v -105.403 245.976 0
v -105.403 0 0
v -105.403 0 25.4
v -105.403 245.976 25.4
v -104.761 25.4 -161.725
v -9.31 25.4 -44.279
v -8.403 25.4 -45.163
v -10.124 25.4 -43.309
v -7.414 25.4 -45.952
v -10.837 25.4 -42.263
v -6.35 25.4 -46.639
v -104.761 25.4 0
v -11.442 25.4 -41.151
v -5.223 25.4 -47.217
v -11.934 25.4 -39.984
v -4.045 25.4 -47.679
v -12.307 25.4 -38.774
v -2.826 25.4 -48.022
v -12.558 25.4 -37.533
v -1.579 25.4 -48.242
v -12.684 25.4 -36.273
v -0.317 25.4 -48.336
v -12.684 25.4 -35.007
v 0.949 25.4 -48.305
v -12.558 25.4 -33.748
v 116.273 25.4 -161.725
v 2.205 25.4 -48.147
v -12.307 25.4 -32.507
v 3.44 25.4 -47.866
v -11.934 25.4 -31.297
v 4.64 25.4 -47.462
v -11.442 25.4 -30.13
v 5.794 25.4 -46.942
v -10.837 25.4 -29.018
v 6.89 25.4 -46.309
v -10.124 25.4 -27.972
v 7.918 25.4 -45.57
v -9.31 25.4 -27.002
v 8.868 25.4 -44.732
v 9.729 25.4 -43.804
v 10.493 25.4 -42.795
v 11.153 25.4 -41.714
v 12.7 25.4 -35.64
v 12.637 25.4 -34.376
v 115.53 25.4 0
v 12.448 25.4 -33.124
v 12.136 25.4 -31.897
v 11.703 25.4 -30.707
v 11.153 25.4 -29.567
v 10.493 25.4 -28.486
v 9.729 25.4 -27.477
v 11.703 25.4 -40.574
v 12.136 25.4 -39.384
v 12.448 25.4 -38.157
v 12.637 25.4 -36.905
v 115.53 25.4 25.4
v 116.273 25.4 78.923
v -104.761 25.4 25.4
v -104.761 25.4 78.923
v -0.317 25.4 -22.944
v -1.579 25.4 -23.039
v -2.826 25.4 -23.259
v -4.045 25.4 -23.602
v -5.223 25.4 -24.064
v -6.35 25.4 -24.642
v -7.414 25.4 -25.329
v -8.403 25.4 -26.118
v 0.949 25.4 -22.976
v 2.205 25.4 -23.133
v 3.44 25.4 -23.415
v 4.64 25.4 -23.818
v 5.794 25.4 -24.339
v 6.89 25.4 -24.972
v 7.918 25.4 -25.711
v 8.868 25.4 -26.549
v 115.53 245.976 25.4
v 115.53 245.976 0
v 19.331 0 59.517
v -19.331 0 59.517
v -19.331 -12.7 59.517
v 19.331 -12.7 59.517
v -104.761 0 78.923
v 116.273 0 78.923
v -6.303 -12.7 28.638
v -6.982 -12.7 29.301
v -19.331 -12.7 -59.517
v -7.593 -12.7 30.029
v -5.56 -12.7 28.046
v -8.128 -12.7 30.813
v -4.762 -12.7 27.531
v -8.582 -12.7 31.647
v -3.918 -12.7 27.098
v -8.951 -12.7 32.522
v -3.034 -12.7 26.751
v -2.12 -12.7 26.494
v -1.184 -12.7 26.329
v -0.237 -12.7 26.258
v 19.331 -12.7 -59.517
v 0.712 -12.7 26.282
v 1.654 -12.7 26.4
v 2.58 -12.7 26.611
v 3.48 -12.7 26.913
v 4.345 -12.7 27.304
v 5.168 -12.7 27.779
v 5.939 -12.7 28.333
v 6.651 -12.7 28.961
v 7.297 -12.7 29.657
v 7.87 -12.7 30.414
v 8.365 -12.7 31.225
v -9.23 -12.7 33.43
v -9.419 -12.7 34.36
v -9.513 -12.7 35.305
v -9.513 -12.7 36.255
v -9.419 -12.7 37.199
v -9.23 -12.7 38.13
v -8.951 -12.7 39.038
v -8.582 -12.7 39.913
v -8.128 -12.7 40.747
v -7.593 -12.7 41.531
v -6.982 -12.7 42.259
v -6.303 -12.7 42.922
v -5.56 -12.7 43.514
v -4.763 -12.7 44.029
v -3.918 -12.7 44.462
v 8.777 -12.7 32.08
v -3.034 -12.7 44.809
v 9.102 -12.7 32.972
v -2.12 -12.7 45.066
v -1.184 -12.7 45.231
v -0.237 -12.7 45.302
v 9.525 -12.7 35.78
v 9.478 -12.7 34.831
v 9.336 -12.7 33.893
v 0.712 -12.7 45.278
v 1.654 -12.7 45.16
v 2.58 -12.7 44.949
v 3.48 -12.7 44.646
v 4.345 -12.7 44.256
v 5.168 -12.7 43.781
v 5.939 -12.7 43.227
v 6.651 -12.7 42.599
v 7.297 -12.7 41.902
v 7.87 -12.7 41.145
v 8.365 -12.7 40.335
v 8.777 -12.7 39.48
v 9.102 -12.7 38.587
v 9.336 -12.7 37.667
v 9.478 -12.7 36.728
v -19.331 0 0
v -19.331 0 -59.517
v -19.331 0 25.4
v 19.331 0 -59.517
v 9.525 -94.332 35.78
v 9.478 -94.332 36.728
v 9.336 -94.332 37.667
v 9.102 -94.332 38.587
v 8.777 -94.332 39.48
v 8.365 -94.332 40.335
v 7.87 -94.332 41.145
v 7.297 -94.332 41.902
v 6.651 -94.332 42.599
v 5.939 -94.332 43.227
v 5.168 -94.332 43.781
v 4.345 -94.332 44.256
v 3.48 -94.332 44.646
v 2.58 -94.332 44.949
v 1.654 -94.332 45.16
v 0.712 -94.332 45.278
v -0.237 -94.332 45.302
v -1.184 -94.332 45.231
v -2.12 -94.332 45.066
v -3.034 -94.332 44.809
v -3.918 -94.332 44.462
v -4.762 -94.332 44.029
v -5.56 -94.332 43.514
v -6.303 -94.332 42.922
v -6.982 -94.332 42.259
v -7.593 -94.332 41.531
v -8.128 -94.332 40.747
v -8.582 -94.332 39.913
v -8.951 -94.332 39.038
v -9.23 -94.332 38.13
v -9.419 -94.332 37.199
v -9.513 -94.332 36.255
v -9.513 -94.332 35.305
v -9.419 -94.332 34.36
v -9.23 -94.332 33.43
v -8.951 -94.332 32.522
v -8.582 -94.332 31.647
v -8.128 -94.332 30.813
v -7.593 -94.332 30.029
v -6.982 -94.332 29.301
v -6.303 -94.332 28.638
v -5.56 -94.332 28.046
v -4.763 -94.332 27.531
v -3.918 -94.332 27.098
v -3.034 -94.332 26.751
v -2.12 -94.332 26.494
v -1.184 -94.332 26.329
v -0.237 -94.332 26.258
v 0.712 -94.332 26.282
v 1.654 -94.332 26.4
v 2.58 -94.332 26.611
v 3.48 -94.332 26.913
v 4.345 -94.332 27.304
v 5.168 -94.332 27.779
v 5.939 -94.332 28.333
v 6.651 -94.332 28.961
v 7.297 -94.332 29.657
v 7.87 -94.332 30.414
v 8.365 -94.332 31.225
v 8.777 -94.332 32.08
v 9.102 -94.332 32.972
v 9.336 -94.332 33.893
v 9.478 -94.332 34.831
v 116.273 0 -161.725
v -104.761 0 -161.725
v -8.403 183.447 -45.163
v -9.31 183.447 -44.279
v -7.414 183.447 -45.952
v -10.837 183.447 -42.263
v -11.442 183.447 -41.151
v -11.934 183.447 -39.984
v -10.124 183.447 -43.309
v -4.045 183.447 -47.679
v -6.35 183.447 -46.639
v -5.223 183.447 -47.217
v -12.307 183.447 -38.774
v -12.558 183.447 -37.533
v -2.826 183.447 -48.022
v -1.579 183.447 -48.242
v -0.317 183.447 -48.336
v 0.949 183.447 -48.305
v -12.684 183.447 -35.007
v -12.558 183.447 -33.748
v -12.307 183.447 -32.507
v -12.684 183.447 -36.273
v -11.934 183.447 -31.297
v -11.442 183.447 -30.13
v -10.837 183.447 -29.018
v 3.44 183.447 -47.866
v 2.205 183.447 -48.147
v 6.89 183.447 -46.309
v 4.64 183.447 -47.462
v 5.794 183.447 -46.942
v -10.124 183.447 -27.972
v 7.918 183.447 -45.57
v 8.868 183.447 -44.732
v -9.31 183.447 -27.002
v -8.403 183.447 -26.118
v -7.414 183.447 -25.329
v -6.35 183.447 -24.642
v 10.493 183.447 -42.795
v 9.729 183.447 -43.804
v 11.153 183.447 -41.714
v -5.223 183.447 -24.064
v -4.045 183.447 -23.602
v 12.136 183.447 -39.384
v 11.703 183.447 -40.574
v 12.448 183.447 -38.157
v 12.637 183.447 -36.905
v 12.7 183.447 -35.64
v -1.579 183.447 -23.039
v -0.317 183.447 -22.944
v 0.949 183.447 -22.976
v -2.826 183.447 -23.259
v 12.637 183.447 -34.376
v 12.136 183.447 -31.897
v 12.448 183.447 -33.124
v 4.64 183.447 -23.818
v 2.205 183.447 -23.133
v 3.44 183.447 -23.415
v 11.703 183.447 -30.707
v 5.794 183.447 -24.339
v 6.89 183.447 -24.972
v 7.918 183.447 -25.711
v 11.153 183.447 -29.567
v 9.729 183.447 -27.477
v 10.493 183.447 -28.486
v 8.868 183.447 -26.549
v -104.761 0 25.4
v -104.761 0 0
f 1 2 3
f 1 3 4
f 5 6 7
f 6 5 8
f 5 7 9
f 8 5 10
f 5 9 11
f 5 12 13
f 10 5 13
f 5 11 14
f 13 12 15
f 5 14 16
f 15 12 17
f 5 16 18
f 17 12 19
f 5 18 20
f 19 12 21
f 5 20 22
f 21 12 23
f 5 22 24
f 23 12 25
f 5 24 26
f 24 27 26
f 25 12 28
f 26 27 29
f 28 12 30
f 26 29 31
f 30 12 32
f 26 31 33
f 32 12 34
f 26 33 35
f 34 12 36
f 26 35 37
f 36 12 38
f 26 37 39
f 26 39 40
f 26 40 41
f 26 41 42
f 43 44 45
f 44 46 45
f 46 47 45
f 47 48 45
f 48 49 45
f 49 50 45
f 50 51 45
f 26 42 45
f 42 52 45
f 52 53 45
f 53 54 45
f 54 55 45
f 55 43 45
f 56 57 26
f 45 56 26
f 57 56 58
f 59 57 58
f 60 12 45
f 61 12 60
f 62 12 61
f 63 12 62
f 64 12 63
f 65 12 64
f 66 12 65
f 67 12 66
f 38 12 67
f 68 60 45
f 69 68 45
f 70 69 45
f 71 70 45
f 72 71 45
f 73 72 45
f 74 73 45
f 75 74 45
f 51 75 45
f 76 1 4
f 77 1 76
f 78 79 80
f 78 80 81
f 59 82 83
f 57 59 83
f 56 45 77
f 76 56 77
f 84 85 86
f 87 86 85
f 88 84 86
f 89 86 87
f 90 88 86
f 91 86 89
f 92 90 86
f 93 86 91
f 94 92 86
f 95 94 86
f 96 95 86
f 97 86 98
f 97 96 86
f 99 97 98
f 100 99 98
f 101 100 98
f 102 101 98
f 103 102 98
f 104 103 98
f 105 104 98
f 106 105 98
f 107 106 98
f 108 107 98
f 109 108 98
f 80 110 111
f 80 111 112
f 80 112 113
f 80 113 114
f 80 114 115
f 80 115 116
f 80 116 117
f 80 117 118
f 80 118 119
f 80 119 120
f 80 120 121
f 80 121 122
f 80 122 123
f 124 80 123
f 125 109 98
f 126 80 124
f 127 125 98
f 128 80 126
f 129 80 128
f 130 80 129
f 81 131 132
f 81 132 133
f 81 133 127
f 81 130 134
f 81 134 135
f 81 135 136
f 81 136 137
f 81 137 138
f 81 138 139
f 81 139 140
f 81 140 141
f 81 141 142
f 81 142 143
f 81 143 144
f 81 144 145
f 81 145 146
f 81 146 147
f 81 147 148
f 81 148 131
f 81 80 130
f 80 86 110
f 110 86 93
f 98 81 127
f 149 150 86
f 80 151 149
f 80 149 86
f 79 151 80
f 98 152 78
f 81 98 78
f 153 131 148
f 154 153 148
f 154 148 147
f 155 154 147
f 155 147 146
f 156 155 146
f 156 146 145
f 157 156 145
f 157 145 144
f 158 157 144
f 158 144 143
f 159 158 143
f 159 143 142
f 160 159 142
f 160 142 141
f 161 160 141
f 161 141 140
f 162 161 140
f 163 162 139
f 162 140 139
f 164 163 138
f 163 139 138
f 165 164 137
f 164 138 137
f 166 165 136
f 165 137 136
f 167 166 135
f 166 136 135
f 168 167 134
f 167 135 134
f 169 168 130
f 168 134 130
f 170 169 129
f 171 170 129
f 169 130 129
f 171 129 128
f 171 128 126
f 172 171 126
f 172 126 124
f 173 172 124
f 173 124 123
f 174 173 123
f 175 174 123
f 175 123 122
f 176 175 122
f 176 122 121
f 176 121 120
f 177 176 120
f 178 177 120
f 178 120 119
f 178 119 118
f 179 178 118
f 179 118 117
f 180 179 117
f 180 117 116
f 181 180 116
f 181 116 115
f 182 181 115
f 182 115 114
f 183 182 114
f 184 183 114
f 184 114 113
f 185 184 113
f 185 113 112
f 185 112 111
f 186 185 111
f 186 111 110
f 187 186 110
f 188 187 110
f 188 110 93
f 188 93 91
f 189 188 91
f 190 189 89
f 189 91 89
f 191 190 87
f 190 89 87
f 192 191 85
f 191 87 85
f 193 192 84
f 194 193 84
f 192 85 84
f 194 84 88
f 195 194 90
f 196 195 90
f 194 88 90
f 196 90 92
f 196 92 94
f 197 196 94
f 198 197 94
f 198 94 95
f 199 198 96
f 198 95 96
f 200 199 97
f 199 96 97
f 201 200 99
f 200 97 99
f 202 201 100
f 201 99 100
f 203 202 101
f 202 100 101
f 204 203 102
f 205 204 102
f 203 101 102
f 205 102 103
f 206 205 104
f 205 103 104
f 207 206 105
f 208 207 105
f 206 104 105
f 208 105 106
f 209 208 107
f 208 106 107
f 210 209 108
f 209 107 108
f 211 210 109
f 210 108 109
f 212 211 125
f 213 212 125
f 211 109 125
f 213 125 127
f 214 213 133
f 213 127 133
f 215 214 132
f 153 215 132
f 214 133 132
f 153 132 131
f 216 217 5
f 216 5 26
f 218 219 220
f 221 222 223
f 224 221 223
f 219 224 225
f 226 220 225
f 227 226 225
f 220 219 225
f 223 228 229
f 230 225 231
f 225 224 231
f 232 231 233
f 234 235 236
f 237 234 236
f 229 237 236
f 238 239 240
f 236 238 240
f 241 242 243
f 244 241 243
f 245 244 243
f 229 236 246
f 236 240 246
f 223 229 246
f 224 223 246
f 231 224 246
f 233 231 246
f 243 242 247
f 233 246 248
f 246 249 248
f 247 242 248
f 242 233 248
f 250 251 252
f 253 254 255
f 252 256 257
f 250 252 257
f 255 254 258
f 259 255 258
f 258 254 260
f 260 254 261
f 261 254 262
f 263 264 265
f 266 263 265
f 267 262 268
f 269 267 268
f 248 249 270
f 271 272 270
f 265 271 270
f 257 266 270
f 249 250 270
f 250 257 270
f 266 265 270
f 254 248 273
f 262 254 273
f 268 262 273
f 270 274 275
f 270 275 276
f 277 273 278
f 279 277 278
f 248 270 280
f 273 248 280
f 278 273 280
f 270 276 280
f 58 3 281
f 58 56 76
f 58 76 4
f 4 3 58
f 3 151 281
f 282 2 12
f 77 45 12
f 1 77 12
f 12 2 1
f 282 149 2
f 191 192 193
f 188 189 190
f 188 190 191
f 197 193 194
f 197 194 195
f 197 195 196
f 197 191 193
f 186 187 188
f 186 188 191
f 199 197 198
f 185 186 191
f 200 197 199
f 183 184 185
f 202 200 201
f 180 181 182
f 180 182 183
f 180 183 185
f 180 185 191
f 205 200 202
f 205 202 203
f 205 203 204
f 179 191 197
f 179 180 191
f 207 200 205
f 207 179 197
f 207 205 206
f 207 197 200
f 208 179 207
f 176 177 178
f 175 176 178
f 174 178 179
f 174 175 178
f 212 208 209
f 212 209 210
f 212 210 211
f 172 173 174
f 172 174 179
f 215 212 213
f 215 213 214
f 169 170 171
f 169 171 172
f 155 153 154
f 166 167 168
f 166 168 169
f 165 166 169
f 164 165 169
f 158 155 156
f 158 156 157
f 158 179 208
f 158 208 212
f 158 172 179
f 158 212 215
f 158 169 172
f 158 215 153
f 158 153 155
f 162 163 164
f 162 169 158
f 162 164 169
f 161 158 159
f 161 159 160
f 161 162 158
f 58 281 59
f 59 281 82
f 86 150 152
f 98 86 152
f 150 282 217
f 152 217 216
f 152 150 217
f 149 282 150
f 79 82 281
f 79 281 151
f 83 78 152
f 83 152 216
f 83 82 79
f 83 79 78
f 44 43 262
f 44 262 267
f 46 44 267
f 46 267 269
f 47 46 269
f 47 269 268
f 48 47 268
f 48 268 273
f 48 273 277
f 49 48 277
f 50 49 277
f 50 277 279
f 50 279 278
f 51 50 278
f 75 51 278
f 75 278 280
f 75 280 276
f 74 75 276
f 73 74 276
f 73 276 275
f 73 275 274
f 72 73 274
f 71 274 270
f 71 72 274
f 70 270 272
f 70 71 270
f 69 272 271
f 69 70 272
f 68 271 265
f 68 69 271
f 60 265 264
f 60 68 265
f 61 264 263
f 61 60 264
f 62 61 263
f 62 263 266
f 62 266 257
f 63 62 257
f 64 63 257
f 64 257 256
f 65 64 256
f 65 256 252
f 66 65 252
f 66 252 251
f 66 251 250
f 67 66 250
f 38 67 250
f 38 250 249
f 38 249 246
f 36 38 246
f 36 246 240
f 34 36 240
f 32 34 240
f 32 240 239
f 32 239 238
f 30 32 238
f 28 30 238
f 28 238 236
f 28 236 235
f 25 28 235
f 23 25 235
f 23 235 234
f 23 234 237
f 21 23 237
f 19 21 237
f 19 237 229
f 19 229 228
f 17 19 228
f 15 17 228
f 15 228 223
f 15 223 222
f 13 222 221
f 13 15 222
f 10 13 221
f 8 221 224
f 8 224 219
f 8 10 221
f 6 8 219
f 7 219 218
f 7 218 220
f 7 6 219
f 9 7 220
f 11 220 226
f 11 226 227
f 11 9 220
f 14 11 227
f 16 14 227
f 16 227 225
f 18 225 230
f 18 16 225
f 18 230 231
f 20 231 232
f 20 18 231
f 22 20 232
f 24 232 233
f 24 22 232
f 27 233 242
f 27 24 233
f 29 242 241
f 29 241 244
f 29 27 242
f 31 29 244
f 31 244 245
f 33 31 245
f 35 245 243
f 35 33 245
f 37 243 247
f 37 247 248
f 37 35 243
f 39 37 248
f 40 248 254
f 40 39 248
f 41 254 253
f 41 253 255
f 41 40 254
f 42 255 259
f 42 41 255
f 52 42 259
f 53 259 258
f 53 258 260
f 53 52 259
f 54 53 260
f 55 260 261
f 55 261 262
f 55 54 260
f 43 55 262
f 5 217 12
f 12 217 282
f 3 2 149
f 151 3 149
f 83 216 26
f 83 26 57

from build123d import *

# Parameters (mm, degrees)
F0_W          = 38.661484
F0_H          = 119.03402
F1_DEPTH      = 12.7
F3_R          = 12.7
F4_DEPTH      = 183.44656
F4_DEPTH_BACK = 8.28374
F2_R          = 9.525
F5_DEPTH      = 94.33232
F6_W          = 221.033588
F6_H          = 240.64786
F7_DEPTH      = 25.4
F8_W          = 220.933356
F8_H          = 245.975703
F9_DEPTH      = 25.4


with BuildPart() as f1:
    # F0 (on Front) → F1 (new body)
    with BuildSketch(Plane.XZ):
        Rectangle(F0_W, F0_H)
    extrude(amount=F1_DEPTH)

    # F3 (on Front) → F4 (join, two sides)
    with BuildSketch(Plane.XZ) as f4_sk:
        with Locations((0, -35.640396)):
            Circle(F3_R)
    extrude(amount=-F4_DEPTH)
    extrude(f4_sk.sketch, amount=-F4_DEPTH_BACK)

    # F2 (on Front) → F5 (join)
    with BuildSketch(Plane.XZ):
        with Locations((0, 35.779871)):
            Circle(F2_R)
    extrude(amount=F5_DEPTH)

    # F6 (on Front) → F7 (join)
    with BuildSketch(Plane.XZ):
        with Locations((5.755909, -41.401114)):
            Rectangle(F6_W, F6_H)
    extrude(amount=-F7_DEPTH)

    # F8 (on Top) → F9 (join)
    with BuildSketch(Plane.XY):
        with Locations((5.063448, 122.987851)):
            Rectangle(F8_W, F8_H)
    extrude(amount=F9_DEPTH)


solid = f1.part
